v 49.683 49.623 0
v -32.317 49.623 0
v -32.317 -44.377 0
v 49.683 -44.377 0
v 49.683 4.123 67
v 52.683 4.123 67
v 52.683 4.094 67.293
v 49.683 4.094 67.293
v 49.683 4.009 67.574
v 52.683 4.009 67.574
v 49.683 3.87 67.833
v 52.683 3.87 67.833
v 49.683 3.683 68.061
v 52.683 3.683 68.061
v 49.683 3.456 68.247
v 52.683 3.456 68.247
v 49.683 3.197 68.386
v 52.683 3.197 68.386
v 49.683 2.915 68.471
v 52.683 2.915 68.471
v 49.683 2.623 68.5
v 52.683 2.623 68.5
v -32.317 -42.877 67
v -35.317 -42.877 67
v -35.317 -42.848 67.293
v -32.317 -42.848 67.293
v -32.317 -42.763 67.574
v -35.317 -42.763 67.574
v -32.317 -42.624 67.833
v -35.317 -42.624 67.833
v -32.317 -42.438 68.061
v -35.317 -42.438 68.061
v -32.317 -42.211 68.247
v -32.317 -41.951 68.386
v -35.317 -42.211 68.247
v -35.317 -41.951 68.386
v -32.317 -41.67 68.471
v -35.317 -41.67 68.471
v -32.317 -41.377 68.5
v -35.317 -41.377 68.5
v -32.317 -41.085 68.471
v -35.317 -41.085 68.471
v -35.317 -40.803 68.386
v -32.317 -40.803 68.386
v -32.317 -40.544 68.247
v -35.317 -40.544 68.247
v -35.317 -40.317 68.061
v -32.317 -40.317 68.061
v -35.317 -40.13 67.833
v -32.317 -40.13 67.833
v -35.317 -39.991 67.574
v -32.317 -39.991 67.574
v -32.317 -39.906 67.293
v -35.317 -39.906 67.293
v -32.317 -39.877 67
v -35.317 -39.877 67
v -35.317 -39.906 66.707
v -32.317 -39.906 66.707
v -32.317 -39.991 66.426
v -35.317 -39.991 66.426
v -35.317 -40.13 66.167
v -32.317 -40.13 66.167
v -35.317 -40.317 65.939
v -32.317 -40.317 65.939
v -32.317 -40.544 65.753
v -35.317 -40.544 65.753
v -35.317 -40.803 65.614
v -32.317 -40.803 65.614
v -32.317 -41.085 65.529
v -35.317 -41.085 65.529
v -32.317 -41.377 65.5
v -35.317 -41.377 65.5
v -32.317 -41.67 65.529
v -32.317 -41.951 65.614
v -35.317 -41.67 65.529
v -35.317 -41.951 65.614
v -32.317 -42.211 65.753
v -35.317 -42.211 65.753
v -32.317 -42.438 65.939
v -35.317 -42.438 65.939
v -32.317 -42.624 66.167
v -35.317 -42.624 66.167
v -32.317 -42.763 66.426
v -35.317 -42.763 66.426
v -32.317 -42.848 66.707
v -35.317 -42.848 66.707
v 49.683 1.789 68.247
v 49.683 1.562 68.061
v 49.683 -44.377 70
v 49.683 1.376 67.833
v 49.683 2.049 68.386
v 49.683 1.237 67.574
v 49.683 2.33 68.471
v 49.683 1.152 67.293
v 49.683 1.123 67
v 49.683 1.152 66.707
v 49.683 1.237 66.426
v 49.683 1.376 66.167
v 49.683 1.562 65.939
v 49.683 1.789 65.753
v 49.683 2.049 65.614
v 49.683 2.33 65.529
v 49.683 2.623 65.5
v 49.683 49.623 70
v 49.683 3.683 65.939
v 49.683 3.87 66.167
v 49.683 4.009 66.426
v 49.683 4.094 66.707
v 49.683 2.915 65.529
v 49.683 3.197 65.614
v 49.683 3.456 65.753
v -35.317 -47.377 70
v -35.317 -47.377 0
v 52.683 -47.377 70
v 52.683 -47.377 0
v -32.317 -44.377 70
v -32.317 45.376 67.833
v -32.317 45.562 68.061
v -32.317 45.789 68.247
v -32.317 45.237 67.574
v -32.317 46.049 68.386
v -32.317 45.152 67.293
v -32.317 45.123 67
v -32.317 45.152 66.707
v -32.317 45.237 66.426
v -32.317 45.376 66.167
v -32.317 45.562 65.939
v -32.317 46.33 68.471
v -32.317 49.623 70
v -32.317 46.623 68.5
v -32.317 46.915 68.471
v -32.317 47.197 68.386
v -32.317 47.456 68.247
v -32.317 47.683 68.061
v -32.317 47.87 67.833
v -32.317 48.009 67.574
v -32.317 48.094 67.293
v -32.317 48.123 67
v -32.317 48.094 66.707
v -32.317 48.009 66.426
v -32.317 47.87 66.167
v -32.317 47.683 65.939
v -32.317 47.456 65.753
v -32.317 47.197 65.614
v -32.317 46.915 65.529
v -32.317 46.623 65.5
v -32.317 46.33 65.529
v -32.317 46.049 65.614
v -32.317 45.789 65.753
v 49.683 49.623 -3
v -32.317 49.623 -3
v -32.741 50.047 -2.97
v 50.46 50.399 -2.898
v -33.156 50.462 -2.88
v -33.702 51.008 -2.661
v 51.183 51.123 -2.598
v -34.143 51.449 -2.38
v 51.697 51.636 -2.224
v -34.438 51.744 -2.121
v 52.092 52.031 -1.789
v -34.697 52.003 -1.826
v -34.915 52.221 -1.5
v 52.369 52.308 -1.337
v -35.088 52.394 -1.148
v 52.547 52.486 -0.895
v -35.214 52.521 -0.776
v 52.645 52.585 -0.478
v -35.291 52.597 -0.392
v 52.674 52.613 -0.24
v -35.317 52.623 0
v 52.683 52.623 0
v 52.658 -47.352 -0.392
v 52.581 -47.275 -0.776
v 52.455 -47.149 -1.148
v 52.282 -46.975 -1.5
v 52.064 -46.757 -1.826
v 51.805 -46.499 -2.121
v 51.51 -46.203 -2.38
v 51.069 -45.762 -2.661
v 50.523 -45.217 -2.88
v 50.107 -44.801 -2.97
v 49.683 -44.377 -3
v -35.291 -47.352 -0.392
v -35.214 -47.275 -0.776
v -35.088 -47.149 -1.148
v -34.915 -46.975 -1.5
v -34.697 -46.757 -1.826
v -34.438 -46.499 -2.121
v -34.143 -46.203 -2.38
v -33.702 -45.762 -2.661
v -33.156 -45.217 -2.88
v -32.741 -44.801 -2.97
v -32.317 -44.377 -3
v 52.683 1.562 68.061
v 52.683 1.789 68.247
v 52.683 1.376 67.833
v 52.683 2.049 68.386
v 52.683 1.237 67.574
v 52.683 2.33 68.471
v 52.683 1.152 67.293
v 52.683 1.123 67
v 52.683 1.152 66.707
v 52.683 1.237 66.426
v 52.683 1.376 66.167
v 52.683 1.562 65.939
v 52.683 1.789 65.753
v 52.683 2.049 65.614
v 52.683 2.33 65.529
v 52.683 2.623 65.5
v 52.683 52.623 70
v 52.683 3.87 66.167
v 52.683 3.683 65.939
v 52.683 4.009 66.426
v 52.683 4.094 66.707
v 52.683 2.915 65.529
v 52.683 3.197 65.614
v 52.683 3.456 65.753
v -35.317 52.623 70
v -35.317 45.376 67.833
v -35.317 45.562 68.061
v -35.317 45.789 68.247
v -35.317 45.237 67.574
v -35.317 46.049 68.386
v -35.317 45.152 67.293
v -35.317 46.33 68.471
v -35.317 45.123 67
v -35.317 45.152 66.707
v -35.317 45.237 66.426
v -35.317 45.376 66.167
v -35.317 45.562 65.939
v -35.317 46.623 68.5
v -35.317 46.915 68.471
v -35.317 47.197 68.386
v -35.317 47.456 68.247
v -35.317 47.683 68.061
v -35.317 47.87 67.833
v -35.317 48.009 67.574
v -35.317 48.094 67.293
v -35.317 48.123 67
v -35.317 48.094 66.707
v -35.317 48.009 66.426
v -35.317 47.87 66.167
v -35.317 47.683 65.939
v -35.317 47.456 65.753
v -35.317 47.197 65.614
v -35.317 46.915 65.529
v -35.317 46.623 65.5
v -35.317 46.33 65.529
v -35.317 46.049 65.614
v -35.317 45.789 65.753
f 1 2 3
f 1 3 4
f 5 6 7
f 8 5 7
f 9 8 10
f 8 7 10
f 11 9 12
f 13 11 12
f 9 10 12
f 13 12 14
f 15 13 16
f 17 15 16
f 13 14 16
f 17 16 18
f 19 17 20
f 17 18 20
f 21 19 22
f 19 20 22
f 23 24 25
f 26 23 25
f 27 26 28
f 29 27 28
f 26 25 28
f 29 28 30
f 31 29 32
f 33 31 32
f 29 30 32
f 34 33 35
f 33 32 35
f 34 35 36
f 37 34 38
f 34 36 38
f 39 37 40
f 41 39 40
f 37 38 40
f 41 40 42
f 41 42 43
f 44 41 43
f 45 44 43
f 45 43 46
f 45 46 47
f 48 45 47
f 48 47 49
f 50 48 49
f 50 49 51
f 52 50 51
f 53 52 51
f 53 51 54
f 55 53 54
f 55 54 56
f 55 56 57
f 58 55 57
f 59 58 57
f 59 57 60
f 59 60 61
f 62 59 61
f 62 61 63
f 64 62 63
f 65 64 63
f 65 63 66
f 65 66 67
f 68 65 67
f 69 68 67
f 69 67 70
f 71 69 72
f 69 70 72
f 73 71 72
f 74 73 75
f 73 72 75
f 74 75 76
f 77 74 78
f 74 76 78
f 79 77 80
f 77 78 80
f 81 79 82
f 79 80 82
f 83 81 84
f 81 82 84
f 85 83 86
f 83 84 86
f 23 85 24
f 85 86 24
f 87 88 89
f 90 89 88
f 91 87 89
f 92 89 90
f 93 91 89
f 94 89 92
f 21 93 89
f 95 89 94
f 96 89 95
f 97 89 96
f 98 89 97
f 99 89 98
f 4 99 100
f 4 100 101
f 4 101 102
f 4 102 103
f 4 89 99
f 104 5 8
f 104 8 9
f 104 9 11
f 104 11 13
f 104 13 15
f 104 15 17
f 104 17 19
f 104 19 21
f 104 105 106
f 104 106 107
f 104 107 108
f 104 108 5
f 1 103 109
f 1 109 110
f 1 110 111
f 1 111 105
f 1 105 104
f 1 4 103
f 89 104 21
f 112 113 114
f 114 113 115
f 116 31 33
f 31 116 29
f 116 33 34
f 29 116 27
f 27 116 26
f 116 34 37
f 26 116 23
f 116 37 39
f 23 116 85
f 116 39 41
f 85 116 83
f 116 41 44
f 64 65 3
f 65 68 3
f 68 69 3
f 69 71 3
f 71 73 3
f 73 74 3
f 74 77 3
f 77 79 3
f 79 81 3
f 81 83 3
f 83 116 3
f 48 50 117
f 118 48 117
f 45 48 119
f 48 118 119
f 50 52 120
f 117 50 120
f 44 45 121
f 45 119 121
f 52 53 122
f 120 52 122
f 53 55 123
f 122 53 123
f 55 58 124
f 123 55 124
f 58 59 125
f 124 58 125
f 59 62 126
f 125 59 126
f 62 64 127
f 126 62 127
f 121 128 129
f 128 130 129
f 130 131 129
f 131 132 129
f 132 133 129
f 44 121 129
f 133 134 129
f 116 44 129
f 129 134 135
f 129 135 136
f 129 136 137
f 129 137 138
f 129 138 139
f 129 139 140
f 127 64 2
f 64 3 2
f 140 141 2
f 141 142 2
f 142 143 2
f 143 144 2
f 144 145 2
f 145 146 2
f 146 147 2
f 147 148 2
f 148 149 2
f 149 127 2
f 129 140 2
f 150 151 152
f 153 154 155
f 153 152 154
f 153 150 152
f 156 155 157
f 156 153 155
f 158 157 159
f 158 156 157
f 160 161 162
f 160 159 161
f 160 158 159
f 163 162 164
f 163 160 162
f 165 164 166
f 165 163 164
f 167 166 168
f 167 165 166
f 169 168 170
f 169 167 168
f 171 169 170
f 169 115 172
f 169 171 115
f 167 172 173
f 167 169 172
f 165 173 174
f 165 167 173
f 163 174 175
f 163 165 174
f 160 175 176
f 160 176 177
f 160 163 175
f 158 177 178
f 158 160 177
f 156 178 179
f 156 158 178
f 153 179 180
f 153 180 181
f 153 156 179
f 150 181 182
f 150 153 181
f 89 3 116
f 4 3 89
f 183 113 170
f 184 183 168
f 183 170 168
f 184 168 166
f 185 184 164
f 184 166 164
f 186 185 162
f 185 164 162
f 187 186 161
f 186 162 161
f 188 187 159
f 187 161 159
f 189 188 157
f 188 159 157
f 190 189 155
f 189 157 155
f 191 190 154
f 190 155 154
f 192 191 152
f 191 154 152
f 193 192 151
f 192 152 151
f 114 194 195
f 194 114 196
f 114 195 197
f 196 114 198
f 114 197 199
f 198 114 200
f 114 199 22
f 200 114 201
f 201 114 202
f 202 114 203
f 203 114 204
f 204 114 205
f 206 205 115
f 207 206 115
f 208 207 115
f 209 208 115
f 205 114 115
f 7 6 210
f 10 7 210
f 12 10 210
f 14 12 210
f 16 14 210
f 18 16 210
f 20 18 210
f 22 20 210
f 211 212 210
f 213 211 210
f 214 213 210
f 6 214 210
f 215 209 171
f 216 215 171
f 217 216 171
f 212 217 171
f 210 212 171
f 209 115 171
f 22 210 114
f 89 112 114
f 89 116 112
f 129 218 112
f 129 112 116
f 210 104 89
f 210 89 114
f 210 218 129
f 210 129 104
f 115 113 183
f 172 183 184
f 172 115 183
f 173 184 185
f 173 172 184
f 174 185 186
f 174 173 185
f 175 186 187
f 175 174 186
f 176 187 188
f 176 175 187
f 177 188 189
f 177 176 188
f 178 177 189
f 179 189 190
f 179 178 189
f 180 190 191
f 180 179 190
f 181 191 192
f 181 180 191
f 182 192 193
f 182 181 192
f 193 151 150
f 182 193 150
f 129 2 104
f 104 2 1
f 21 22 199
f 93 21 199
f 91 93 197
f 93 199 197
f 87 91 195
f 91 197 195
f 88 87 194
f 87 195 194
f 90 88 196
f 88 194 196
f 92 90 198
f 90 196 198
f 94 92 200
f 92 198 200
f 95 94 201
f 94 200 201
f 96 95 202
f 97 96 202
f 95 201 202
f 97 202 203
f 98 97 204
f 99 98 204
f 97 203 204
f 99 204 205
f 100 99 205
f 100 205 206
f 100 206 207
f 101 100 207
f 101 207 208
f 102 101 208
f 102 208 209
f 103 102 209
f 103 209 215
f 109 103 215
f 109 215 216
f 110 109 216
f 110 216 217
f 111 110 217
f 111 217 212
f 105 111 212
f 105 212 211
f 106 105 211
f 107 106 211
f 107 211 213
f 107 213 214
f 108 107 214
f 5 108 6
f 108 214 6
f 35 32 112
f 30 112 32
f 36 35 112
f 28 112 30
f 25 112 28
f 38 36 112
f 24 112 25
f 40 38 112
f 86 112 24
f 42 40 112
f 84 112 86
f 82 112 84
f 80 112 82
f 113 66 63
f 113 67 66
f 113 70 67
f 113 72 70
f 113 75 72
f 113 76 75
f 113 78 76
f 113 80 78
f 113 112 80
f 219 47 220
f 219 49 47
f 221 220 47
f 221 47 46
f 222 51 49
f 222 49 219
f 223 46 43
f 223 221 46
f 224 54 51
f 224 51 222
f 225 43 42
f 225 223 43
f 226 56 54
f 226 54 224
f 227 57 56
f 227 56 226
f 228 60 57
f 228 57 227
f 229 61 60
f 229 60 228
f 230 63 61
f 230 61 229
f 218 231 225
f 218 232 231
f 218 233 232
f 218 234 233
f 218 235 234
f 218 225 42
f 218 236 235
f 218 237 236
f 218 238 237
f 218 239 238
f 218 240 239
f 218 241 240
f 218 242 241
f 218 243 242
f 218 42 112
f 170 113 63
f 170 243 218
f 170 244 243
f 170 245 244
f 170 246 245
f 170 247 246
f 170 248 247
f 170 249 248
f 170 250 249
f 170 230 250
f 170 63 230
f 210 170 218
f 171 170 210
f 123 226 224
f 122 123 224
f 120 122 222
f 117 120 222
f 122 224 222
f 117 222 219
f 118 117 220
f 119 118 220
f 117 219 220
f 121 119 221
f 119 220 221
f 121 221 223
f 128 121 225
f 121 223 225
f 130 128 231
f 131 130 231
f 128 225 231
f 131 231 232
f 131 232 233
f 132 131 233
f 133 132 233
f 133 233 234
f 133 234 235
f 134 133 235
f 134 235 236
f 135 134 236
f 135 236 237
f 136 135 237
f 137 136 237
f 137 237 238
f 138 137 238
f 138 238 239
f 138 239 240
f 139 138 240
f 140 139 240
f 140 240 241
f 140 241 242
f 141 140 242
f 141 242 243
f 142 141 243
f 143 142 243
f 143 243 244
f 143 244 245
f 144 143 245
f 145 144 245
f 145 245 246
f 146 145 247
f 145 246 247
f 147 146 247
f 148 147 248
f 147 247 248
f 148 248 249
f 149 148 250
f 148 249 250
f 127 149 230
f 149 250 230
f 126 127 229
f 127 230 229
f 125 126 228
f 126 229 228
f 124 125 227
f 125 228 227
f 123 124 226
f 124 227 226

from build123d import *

# Parameters (mm, degrees)
F0_W     = 88
F0_H     = 100
F2_DEPTH = 3
F1_W     = 88
F1_H     = 100
F1_W_2   = 82
F1_H_2   = 94
F3_DEPTH = 70
F4_R     = 3
F5_R     = 1.5
F6_DEPTH = 25
F8_DEPTH = 25


with BuildPart() as f2:
    # F0 (on Top) → F2 (new body)
    with BuildSketch(Plane.XY):
        with Locations((8.683464, 2.622797)):
            Rectangle(F0_W, F0_H)
    extrude(amount=-F2_DEPTH)

    # F1 (on face) → F3 (join)
    with BuildSketch(Plane.XY):
        with Locations((8.683464, 2.622797)):
            Rectangle(F1_W, F1_H)
        with Locations((8.683464, 2.622797)):
            Rectangle(F1_W_2, F1_H_2, mode=Mode.SUBTRACT)
    extrude(amount=F3_DEPTH)

    # F4
    f4_edges = [f2.edges().sort_by_distance(p)[0] for p in [
        (-35.316536, 2.622797, -3),
        (8.683464, 52.622797, -3),
        (8.683464, -47.377203, -3),
        (52.683464, 2.622797, -3),
    ]]
    fillet(f4_edges, radius=F4_R)

    # F5 (on face) → F6 (cut)
    with BuildSketch(Plane(origin=(-35.316536, 0, 0), x_dir=(0, -1, 0), z_dir=(-1, 0, 0))):
        with Locations((-46.622797, 67)):
            Circle(F5_R)
        with Locations((41.377203, 67)):
            Circle(F5_R)
    extrude(amount=-F6_DEPTH, mode=Mode.SUBTRACT)

    # F7 (on face) → F8 (cut)
    with BuildSketch(Plane.YZ.offset(52.683464)):
        with BuildLine():
            ThreePointArc((2.622797, 68.5), (1.562137, 65.93934), (4.122797, 67))
            ThreePointArc((4.122797, 67), (3.683457, 68.06066), (2.622797, 68.5))
        make_face()
    extrude(amount=-F8_DEPTH, mode=Mode.SUBTRACT)


solid = f2.part
